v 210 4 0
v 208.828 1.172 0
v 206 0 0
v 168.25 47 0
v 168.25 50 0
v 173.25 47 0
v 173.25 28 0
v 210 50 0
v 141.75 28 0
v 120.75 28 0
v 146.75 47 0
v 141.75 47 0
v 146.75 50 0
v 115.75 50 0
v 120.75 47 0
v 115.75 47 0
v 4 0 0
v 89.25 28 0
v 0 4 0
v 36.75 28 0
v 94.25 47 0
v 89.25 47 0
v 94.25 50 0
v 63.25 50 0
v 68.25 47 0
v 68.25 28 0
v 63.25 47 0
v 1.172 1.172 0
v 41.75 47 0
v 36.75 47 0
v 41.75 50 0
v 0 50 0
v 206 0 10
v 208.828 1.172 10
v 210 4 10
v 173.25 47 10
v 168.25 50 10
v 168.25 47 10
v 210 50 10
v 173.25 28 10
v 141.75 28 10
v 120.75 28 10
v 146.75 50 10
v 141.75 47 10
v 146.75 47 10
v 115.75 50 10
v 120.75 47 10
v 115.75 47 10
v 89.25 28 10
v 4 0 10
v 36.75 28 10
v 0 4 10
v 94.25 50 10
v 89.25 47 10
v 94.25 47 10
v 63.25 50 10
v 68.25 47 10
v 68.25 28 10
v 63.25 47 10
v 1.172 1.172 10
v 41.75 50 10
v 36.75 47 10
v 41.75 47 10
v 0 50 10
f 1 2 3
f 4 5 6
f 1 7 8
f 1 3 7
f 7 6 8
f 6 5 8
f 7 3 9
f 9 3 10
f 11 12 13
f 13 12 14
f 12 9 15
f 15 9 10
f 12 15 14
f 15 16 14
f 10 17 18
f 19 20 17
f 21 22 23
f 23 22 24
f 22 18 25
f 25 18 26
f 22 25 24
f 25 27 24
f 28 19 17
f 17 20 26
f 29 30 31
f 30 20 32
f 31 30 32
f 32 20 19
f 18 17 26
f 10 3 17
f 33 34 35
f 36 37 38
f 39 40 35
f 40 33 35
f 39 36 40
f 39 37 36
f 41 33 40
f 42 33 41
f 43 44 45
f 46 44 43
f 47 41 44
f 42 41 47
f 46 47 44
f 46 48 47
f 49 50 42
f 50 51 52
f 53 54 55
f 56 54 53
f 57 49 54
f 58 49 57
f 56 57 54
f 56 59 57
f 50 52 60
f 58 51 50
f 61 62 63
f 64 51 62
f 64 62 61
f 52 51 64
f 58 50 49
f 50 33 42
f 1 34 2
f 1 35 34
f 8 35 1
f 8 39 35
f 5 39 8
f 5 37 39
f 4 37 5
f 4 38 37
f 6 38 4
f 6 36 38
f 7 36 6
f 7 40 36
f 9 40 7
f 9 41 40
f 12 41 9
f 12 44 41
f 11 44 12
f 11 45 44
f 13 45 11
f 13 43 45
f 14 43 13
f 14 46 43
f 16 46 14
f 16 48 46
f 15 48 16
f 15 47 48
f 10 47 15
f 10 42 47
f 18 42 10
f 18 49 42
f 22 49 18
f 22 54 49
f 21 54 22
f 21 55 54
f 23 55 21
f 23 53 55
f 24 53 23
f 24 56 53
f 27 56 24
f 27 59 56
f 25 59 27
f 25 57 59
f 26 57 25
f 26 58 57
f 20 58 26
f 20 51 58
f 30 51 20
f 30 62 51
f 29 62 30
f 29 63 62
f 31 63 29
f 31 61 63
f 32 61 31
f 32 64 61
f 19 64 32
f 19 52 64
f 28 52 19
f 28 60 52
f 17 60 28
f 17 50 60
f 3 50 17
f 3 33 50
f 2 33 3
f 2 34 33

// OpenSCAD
$fn = 32;

// ----------------------------------------------------------------------
// Oversize slot bar: 210 mm bar with 3 oversize windows
// ----------------------------------------------------------------------

// --- parameters (mm) ---
profile_height = 10;      // extrusion height
profile_points = 32;      // points of the closed outline

profile = [[0, 4], [1.172, 1.172], [4, 0], [206, 0], [208.828, 1.172], [210, 4], [210, 50], [168.25, 50], [168.25, 47], [173.25, 47], [173.25, 28], [141.75, 28], [141.75, 47], [146.75, 47], [146.75, 50], [115.75, 50], [115.75, 47], [120.75, 47], [120.75, 28], [89.25, 28], [89.25, 47], [94.25, 47], [94.25, 50], [63.25, 50], [63.25, 47], [68.25, 47], [68.25, 28], [36.75, 28], [36.75, 47], [41.75, 47], [41.75, 50], [0, 50]];  // single closed polygon, 32 points, counter clockwise

// --- the one profile operation ---
linear_extrude(height = profile_height) polygon(points = profile);
